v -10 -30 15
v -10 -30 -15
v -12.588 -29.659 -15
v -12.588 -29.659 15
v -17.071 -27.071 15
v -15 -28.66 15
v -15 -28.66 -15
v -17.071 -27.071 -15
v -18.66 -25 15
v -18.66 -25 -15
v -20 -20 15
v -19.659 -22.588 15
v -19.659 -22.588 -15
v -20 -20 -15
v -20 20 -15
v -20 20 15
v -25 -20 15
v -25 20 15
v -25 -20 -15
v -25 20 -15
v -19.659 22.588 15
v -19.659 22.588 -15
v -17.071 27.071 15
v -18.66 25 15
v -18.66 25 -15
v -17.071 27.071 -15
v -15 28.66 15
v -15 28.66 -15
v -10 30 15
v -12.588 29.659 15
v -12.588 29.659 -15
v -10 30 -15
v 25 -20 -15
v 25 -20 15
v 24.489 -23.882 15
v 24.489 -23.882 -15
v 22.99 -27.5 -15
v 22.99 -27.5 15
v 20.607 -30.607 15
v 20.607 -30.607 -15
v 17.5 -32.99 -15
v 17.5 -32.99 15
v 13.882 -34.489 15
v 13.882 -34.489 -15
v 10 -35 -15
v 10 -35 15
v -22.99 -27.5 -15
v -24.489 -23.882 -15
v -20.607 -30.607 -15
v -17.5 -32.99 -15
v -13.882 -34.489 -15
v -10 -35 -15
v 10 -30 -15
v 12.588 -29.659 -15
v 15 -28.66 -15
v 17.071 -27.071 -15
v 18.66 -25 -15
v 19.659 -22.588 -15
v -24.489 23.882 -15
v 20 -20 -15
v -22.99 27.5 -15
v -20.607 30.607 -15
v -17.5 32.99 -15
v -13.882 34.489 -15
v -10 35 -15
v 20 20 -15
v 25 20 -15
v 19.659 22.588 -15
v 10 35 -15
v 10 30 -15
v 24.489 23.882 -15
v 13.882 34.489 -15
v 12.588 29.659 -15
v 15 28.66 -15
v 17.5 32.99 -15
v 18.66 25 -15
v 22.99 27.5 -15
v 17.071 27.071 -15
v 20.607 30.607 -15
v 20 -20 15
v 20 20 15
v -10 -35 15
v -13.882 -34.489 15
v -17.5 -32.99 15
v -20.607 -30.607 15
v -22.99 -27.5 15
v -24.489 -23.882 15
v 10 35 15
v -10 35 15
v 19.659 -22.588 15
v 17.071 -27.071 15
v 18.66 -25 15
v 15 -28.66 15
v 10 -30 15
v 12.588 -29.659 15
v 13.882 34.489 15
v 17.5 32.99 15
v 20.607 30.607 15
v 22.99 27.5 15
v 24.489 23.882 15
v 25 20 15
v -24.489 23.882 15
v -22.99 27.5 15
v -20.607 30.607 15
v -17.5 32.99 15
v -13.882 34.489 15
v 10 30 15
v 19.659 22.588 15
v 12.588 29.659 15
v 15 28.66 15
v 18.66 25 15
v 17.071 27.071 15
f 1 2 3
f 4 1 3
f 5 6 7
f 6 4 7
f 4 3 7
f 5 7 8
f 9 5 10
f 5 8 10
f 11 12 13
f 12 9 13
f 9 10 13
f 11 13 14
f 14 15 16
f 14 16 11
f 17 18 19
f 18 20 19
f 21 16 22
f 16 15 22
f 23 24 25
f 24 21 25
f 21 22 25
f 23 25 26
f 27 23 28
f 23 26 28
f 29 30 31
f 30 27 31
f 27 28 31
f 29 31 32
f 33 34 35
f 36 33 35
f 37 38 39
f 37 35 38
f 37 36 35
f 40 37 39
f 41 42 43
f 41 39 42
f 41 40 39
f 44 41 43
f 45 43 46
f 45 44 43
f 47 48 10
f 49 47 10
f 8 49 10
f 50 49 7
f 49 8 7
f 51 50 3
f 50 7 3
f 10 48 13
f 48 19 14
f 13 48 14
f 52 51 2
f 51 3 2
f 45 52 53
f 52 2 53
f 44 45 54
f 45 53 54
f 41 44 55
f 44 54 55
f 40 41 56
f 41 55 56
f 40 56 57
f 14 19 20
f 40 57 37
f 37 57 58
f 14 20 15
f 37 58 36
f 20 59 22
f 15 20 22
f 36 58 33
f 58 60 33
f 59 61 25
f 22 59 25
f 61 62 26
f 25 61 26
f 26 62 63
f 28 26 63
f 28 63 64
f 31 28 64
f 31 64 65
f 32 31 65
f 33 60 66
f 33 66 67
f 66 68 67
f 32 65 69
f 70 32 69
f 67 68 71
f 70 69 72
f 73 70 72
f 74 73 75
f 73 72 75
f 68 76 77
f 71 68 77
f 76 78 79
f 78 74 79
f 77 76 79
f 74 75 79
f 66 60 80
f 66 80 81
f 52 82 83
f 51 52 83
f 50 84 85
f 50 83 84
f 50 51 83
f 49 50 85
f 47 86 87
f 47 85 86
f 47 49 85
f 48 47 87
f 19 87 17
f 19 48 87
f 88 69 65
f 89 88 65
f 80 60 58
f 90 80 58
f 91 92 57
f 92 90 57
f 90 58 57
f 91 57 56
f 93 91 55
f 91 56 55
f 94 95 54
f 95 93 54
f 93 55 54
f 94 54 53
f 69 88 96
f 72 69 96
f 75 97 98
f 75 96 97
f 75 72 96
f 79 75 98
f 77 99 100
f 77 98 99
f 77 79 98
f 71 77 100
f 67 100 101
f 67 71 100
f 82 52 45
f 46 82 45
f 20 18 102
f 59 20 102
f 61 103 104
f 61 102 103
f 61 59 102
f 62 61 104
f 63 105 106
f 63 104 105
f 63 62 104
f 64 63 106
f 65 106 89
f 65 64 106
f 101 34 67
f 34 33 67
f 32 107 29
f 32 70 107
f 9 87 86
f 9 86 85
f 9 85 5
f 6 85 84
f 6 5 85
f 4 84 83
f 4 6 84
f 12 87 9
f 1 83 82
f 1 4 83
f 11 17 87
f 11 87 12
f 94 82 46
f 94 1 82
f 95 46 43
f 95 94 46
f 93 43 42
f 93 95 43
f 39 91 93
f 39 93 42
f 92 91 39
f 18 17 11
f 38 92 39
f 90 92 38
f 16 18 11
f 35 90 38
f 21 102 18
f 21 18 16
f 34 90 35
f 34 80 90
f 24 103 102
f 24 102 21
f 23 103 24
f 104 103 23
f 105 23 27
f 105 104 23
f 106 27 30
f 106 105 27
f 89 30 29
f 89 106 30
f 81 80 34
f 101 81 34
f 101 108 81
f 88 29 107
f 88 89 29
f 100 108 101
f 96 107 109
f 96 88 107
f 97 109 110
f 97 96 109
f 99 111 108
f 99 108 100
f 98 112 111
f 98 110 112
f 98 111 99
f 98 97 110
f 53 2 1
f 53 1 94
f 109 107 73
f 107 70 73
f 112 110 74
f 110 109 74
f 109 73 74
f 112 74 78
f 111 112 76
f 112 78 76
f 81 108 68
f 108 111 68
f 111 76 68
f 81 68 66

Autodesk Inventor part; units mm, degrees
sketch "Эскиз1" plane through (0, 0, 0) normal (0, 0, 1) x (1, 0, 0)
  arc A0 (-20, -20) -> (-10, -30) centre (-10, -20) ccw projected
  line L0 (-20, 20) -> (-20, -20) projected
  arc A1 (-10, 30) -> (-20, 20) centre (-10, 20) ccw projected
  line L1 (10, 30) -> (-10, 30) projected
  arc A2 (20, 20) -> (10, 30) centre (10, 20) ccw projected
  line L2 (20, -20) -> (20, 20) projected
  arc A3 (10, -30) -> (20, -20) centre (10, -20) ccw projected
  line L3 (-10, -30) -> (10, -30) projected
  arc A4 (10, -35) -> (25, -20) centre (10, -20) ccw
  line L4 (25, -20) -> (25, 20)
  arc A5 (25, 20) -> (10, 35) centre (10, 20) ccw
  line L5 (10, 35) -> (-10, 35)
  arc A6 (-10, 35) -> (-25, 20) centre (-10, 20) ccw
  line L6 (-25, 20) -> (-25, -20)
  arc A7 (-25, -20) -> (-10, -35) centre (-10, -20) ccw
  line L7 (-10, -35) -> (10, -35)
  dimension "d4" = 5
extrude "Выдавливание1" add sketch "Эскиз1" along normal mid plane 30
properties part number "Козырёк_версия_2"
